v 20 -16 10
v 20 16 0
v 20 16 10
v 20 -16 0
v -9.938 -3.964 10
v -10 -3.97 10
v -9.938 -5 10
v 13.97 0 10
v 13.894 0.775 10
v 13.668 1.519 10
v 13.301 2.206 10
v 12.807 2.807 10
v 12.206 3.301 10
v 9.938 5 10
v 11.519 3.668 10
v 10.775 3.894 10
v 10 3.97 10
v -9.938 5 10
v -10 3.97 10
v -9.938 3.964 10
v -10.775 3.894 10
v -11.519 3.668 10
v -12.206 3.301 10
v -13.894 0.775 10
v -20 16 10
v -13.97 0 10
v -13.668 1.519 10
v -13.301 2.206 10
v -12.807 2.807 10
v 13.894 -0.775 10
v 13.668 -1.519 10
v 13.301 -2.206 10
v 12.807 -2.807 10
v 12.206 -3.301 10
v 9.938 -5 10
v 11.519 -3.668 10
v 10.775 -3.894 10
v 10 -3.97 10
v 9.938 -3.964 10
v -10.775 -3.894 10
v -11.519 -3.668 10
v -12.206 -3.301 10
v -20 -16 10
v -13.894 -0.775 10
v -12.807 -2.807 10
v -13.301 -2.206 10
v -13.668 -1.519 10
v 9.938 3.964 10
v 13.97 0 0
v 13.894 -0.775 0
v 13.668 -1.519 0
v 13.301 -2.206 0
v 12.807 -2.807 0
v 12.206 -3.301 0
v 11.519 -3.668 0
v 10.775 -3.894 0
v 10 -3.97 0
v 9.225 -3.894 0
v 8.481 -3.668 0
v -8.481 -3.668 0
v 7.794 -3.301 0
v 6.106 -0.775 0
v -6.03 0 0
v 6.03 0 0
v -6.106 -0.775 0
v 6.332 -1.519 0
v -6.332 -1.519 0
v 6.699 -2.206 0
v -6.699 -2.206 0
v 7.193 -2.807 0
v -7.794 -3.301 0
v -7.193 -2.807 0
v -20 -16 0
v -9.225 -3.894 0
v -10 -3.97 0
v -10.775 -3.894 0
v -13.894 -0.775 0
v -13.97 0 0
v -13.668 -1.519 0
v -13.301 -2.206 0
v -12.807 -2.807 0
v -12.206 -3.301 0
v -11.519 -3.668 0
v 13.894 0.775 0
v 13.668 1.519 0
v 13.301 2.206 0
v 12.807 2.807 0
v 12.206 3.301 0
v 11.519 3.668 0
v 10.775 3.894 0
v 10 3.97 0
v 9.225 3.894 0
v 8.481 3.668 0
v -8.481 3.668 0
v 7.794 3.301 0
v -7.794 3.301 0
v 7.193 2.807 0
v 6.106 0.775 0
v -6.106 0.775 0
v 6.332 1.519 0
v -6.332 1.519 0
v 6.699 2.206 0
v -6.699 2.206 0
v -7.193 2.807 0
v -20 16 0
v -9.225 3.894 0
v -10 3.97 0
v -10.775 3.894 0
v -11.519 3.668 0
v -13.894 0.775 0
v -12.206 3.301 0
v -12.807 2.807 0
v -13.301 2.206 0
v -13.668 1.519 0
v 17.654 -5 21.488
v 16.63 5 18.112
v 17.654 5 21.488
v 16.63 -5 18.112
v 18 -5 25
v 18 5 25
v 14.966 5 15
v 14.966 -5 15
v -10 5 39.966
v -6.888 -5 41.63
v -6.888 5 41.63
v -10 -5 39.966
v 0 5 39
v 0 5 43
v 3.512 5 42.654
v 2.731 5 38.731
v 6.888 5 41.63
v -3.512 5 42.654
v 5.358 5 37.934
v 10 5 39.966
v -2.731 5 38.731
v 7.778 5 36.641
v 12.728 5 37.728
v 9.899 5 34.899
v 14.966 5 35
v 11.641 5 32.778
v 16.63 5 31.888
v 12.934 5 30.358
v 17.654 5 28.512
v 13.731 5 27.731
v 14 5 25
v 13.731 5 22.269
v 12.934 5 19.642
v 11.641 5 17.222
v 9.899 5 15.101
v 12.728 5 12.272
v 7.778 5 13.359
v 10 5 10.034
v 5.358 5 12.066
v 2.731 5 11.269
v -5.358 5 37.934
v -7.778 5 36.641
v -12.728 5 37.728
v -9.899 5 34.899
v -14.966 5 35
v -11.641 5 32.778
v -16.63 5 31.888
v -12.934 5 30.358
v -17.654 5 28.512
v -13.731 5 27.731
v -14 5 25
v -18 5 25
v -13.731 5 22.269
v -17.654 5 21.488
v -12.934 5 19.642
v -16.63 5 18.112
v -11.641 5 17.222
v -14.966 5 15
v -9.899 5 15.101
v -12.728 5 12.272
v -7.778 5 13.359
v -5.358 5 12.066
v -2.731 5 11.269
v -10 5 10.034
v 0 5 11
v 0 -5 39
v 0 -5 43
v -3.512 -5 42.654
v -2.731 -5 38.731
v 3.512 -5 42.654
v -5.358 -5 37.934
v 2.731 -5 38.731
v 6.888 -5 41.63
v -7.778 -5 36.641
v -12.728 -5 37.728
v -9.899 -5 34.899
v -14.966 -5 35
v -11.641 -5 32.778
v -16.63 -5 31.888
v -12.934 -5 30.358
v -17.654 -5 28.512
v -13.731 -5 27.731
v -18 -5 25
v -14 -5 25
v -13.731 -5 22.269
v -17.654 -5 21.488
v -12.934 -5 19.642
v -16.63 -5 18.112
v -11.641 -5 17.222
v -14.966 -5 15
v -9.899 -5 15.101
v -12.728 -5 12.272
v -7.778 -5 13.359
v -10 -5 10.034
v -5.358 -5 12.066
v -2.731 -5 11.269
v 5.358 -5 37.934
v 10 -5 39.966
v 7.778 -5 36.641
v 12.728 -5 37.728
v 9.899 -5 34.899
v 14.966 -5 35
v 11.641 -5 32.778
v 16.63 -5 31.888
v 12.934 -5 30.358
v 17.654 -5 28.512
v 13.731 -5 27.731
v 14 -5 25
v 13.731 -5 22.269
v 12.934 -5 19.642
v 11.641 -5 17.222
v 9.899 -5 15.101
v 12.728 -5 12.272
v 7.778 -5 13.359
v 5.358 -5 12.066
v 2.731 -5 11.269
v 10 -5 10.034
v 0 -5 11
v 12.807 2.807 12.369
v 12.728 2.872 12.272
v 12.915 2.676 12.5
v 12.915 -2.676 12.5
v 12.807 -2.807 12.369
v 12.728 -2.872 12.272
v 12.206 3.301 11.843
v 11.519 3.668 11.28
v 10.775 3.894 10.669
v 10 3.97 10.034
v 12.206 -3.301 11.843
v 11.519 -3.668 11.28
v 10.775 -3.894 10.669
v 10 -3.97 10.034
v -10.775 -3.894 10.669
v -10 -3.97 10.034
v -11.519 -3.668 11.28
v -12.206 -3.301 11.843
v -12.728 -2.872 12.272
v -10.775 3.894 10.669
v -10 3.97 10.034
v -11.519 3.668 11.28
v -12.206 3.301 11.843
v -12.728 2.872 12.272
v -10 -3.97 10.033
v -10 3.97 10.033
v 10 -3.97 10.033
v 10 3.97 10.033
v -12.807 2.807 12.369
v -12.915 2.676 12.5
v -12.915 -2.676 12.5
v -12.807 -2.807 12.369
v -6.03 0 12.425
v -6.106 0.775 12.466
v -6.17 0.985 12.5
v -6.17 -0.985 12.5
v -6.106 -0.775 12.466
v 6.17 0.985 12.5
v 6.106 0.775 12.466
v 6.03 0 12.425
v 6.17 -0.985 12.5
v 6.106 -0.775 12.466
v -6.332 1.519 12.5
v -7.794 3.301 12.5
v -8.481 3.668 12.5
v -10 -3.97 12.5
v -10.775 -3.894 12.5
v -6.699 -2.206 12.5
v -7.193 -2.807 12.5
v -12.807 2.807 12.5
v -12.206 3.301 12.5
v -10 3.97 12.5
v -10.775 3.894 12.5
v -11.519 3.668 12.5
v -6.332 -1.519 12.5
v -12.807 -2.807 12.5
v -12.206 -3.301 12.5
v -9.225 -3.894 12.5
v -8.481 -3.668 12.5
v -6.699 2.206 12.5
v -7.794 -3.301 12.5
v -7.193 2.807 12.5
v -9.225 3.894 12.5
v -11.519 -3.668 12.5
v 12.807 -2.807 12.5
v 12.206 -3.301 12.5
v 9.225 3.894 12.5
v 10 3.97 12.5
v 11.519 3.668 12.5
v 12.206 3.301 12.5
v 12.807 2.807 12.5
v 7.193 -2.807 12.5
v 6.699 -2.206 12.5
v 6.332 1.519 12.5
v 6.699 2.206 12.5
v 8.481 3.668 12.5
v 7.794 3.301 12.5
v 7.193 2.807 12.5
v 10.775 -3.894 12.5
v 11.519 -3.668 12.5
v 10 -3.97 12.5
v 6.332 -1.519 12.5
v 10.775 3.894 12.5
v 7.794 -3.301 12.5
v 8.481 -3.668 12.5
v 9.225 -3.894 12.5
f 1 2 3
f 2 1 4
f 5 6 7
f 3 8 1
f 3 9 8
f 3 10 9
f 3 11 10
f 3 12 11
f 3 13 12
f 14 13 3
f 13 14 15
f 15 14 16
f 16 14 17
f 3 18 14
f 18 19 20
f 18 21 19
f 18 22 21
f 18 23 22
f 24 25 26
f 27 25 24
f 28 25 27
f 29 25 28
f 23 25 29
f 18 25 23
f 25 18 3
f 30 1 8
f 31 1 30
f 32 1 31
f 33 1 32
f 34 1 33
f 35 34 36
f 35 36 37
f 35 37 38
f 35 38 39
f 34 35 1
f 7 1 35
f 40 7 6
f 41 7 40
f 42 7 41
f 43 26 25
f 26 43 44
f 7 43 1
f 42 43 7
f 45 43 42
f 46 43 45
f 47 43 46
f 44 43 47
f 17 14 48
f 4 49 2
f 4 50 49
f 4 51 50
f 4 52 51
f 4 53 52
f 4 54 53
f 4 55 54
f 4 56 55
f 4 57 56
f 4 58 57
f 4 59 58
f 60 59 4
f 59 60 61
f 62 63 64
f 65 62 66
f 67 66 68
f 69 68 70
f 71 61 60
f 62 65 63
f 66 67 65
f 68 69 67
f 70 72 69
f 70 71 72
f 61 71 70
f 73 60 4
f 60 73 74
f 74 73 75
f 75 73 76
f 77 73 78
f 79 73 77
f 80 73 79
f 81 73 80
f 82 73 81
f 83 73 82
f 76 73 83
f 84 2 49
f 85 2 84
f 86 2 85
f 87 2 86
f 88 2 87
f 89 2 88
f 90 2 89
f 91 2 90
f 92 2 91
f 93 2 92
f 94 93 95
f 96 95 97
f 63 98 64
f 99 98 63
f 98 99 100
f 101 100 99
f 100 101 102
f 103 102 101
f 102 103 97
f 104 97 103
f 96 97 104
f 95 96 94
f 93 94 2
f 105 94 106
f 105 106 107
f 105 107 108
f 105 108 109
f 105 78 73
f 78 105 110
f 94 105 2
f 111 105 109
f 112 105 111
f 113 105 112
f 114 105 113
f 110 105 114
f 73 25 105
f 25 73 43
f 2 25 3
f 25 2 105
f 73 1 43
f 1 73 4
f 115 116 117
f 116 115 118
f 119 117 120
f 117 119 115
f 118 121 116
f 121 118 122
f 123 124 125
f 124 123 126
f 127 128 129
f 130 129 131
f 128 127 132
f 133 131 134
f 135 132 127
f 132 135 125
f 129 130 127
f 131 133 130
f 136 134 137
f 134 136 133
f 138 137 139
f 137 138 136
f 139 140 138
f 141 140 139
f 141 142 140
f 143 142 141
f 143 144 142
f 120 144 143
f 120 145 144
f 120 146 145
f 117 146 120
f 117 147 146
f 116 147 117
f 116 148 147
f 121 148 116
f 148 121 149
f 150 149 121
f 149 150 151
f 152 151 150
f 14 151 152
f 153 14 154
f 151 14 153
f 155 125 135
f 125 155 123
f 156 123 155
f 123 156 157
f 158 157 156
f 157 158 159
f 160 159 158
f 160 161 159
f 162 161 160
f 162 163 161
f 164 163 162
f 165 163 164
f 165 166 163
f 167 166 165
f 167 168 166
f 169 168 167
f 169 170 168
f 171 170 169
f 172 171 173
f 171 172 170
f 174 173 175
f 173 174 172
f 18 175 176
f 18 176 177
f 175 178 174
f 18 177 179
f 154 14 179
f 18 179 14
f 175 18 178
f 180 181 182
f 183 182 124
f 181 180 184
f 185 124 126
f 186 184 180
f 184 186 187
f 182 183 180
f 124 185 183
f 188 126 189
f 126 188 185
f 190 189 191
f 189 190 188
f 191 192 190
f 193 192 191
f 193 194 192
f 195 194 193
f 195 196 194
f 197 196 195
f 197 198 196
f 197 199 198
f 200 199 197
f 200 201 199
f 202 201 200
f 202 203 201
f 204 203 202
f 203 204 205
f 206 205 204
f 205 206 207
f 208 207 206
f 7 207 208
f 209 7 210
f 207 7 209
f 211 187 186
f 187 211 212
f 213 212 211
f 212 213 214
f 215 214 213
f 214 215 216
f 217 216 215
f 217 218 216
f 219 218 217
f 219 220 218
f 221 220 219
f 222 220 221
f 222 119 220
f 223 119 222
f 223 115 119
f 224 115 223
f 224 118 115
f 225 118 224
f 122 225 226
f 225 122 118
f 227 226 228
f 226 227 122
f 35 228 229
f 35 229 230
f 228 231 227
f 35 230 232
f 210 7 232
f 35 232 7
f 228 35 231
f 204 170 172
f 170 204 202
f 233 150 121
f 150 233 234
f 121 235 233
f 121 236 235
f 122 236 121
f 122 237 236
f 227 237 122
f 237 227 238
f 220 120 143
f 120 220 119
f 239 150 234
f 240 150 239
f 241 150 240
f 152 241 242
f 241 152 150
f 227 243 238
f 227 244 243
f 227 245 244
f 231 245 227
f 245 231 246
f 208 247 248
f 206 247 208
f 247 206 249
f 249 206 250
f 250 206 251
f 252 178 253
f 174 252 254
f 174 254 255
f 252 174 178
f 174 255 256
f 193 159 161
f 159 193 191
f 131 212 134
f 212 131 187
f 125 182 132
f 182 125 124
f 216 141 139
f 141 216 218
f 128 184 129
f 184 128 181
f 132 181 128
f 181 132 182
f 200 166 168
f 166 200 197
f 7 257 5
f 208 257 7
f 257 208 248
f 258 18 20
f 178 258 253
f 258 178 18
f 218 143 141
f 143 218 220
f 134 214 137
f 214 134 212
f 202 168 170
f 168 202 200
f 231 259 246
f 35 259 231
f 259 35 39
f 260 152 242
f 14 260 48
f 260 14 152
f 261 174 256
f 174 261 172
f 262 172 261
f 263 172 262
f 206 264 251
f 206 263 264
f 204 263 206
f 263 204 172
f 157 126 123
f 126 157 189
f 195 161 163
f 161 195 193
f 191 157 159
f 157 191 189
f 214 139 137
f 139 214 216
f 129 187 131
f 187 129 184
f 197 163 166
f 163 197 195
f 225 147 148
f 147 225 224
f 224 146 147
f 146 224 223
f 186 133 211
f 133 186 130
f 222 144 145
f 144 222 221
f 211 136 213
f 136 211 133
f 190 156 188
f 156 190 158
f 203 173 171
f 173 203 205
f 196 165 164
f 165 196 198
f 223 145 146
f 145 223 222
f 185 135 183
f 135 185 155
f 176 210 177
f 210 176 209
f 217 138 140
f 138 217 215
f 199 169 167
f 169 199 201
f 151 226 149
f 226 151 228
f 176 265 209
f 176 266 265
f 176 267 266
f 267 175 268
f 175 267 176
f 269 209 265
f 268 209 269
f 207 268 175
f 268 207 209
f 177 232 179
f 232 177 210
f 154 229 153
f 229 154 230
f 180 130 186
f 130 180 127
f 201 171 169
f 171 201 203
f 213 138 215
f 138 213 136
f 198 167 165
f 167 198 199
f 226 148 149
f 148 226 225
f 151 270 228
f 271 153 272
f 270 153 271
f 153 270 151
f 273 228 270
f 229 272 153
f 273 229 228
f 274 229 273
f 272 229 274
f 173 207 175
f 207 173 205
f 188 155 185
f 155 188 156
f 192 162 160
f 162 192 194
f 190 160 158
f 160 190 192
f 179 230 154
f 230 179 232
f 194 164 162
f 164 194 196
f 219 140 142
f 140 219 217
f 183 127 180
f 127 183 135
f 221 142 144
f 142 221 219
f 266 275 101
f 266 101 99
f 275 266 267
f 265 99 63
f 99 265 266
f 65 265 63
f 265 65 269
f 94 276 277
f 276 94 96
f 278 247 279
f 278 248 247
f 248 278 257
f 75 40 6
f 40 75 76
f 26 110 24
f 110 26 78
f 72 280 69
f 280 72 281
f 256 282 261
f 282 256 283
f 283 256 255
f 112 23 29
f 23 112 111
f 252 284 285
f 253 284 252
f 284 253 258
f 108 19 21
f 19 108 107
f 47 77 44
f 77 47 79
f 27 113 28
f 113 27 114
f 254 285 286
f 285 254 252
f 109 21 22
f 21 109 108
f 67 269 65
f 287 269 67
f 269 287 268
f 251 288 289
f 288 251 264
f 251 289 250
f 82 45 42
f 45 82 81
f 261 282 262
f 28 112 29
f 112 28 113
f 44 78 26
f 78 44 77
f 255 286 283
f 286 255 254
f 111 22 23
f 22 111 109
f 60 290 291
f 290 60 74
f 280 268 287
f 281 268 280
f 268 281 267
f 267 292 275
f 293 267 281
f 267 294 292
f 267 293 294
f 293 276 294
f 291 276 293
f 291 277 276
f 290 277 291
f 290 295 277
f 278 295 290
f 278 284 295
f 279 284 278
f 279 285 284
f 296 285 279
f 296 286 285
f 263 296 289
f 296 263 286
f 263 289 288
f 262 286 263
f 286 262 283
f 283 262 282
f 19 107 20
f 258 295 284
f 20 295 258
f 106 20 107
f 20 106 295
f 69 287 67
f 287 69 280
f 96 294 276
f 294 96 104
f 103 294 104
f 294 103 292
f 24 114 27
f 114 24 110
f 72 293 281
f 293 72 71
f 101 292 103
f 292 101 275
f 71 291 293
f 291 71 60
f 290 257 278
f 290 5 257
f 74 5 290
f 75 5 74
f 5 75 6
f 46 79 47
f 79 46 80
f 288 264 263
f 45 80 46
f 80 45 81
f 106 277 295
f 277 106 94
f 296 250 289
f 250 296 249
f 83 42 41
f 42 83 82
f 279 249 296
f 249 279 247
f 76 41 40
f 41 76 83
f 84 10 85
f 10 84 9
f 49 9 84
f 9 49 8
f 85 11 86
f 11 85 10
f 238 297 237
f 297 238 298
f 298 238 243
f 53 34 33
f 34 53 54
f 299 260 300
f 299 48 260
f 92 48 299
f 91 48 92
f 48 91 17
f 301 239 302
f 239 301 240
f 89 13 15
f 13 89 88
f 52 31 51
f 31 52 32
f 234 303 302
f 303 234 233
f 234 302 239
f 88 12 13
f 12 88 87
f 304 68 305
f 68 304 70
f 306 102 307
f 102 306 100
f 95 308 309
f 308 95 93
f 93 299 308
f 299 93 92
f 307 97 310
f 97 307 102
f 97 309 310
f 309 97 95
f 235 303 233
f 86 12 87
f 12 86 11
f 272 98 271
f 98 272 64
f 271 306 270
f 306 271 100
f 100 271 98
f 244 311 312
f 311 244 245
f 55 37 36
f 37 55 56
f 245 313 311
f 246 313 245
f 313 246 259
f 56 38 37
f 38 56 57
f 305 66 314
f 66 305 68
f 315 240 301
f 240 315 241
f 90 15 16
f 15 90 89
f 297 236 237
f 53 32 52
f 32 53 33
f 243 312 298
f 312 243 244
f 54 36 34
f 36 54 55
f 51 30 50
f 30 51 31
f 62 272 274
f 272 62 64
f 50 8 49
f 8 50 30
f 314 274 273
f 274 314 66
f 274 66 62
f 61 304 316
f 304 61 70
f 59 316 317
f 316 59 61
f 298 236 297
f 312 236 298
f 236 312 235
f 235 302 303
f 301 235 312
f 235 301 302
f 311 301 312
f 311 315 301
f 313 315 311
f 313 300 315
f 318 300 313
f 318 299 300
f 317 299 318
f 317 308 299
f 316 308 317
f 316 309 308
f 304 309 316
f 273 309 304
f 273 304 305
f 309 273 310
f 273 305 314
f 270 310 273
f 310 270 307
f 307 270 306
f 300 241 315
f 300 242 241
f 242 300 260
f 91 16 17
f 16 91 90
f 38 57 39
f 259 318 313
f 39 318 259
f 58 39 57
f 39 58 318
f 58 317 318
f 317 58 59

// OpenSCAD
$fn = 32;

// ----------------------------------------------------------------------
// Deck eye: 36 mm eye on a 40 mm base
// ----------------------------------------------------------------------

// --- parameters (mm) ---
base_l = 40;              // base length
base_w = 32;              // base width
base_t = 10;              // base thickness
eye_r = 18;               // eye outside radius
eye_bore = 28;            // eye bore diameter
eye_w = 10;               // eye thickness
eye_z = 25;               // eye centre height
holes_d = 7.94;           // fixing holes
hole_x = 10;              // fixing hole spacing

difference() {
  union() {
    translate([-20, -16, 0]) cube([base_l, base_w, base_t]);
    /* eye standing upright, its foot sunk 3 mm into the base */
    translate([0, -5, 25]) rotate([-90, 0, 0]) cylinder(h = 10, d = 36);
  }
  /* eye bore, 2.5 mm clear of both faces */
  translate([0, -7.5, 25]) rotate([-90, 0, 0]) cylinder(h = 15, d = 28);
  translate([-10, 0, -2.5]) cylinder(h = base_t + 5, d = holes_d);
  translate([10, 0, -2.5]) cylinder(h = base_t + 5, d = holes_d);
}
